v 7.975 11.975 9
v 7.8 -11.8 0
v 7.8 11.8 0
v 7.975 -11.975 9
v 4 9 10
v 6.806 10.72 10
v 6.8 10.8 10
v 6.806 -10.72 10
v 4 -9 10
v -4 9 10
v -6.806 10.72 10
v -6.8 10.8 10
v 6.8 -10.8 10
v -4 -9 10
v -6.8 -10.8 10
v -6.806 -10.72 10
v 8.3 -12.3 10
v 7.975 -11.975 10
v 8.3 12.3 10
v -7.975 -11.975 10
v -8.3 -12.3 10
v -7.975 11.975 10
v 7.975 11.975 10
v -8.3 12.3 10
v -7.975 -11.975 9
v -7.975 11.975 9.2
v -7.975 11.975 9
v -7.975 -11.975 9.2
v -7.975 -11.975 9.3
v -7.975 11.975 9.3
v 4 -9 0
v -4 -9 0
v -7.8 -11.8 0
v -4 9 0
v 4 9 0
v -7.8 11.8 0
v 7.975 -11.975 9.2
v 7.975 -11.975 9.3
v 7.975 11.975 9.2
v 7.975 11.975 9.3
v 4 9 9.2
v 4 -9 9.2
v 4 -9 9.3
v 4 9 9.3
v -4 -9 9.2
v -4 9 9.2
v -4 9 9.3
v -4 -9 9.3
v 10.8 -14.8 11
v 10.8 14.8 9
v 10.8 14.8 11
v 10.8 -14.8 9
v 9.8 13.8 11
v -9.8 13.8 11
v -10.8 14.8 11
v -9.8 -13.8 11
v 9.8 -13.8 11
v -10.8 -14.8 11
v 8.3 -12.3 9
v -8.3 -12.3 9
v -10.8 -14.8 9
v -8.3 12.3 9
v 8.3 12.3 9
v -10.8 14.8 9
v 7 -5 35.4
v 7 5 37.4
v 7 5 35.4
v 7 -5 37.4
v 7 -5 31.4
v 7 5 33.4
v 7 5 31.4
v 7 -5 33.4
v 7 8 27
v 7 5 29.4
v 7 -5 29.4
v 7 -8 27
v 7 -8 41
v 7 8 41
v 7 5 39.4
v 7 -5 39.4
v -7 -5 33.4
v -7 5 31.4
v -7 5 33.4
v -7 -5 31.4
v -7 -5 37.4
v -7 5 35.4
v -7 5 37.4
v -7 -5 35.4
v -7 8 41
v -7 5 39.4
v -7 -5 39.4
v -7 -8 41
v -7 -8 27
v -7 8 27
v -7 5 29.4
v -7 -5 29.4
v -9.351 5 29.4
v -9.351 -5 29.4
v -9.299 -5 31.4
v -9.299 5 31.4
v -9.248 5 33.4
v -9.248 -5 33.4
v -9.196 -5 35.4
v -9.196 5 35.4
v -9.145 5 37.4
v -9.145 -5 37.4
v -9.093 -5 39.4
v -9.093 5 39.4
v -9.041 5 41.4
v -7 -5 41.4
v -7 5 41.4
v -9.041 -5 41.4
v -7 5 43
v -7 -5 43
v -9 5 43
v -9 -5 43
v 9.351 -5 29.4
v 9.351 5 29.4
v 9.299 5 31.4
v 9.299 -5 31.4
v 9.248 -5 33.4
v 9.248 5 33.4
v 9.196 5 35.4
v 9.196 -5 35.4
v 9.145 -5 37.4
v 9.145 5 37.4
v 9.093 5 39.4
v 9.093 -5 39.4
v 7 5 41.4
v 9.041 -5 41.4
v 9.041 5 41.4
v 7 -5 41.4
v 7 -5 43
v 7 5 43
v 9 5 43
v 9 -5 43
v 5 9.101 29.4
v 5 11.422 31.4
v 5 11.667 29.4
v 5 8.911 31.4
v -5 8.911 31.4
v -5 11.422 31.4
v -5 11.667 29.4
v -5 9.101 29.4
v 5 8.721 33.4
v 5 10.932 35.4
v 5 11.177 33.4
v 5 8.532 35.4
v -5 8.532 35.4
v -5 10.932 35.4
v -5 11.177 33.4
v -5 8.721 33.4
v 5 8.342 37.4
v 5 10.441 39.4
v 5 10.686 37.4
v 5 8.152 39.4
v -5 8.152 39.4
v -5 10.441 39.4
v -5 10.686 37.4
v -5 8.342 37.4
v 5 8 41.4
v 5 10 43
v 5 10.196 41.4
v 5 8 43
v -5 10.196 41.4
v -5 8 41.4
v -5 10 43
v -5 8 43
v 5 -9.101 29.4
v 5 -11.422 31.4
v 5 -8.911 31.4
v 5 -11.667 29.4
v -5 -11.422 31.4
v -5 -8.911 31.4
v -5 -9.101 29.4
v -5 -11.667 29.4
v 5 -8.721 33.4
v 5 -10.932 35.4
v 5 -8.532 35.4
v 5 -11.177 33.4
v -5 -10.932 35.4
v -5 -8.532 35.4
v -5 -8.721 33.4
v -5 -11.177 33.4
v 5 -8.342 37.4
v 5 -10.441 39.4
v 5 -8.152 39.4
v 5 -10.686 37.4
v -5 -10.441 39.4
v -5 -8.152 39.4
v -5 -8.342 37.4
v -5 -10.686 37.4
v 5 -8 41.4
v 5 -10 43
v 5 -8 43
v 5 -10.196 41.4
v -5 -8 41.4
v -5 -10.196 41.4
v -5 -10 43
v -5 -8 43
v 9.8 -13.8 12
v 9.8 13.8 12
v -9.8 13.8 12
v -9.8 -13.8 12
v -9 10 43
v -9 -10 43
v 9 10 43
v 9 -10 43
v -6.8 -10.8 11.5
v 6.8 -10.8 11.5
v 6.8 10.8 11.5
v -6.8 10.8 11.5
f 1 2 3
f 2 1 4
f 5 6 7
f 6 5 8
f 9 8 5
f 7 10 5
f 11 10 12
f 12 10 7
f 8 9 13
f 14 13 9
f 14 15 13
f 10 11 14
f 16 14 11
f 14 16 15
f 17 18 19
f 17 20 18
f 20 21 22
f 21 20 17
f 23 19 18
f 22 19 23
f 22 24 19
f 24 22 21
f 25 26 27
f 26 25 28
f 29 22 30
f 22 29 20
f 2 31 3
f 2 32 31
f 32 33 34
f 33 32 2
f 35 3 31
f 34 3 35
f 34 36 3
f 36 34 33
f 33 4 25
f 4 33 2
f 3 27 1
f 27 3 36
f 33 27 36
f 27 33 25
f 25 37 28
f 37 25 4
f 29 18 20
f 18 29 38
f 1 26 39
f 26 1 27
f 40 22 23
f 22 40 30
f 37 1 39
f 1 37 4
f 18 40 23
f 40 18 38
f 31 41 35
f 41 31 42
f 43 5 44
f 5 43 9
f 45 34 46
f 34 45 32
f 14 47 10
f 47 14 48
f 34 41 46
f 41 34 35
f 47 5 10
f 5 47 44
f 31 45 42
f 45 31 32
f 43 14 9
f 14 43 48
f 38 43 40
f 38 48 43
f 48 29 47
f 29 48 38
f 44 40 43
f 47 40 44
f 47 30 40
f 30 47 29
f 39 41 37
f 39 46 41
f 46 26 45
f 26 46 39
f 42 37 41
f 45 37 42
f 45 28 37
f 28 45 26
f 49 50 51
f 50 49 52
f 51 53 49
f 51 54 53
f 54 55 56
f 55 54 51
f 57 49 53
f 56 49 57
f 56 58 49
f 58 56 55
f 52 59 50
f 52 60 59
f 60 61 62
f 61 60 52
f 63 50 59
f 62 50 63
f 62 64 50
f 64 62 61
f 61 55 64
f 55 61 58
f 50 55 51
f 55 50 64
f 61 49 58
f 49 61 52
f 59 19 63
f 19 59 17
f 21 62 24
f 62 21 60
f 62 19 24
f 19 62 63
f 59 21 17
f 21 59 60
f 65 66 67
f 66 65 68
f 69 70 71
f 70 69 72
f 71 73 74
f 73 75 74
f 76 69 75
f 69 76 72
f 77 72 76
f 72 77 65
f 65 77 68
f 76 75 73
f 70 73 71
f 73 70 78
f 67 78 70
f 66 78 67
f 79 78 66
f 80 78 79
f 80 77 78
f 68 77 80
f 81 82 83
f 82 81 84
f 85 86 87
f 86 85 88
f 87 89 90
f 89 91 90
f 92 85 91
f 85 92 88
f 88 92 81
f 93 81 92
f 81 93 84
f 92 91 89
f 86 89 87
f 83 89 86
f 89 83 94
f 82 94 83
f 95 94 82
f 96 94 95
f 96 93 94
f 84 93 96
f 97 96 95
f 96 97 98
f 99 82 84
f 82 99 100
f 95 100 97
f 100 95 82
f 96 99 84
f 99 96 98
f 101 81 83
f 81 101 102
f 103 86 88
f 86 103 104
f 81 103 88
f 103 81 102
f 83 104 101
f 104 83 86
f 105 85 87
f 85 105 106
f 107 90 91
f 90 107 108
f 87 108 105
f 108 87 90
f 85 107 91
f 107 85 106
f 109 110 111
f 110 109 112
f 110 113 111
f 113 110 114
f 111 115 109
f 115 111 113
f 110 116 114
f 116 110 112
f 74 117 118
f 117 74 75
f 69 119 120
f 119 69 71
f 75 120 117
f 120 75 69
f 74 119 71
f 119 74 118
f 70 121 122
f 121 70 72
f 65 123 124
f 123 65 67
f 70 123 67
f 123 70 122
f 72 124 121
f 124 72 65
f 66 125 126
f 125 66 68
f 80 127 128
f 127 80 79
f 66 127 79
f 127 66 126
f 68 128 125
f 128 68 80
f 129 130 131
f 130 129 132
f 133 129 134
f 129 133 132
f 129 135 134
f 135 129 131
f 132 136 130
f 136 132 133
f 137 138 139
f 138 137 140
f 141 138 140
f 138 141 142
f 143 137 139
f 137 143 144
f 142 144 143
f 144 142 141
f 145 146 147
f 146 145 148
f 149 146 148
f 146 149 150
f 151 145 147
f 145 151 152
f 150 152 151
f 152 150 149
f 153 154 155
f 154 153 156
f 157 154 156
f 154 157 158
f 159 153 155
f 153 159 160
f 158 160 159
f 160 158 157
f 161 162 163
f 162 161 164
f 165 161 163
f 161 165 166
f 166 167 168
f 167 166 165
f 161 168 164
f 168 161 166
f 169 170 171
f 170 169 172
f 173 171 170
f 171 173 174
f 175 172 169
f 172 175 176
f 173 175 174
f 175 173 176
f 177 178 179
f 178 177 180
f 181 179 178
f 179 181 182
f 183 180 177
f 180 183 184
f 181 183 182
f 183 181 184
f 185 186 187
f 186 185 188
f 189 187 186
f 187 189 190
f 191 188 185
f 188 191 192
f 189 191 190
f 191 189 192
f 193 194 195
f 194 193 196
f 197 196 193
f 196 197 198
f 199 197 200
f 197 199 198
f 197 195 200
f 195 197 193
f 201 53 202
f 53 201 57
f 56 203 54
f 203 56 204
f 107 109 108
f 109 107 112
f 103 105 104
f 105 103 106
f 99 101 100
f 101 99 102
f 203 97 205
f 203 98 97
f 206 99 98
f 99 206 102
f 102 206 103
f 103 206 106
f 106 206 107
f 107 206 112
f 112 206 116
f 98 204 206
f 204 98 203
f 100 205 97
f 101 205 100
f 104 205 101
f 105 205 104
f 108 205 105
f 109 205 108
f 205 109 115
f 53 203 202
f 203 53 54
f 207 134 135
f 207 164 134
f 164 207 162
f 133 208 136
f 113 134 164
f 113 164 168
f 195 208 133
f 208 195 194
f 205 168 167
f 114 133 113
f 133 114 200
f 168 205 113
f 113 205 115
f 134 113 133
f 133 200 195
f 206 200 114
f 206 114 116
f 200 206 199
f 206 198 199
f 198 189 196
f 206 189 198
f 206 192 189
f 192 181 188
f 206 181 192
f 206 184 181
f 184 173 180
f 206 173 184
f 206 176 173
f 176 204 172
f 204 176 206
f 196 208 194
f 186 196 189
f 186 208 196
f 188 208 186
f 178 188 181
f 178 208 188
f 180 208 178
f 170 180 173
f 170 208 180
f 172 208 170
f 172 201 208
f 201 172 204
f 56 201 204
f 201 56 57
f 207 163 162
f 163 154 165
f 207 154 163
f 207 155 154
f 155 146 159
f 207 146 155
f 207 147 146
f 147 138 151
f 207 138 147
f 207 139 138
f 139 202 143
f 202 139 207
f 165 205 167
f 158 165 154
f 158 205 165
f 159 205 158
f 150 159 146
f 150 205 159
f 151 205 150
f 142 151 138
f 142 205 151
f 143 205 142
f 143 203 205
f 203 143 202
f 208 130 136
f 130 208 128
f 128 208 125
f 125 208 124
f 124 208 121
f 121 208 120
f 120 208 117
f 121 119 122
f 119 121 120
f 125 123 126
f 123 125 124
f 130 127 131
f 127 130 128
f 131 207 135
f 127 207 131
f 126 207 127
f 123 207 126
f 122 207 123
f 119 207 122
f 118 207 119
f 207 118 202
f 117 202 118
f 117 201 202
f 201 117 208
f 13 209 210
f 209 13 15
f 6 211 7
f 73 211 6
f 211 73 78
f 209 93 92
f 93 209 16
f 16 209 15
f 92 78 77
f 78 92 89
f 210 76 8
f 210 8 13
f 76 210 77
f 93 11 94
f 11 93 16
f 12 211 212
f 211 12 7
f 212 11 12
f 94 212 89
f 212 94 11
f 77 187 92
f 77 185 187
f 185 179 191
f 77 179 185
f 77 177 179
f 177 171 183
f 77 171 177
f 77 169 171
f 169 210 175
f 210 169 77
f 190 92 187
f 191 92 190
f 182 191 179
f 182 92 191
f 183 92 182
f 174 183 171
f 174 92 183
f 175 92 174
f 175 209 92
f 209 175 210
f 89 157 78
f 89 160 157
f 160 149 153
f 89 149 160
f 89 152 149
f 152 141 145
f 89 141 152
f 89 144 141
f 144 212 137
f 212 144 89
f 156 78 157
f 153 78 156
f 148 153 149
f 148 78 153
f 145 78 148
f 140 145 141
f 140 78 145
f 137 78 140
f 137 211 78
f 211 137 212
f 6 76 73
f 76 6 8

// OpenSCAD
// file: sleds.scad
// ==========================================
// Xentient Framework - Universal Sled & Socket Library
// Shared modules for all peripheral caps
// ==========================================
// Per Framework §2: Universal Mating Protocol
// Female Socket (in hub): 24.4×16.4×10.0mm (0.4mm clearance), wire channel 18×8mm
// Male Sled (on cap base): 23.6×15.6×10.0mm, 1° draft, hollow 18×8mm
// Flange: +3mm each side (increased from +2mm for bearing strength)
// Units: mm

$fn = 64;

// ==========================================
// MALE SLED PARAMETERS
// ==========================================

Sled_W       = 23.6;    // Width (0.4mm tolerance in female 24.0mm)
Sled_H       = 15.6;    // Height (0.4mm tolerance in female 16.0mm)
Sled_D       = 10.0;    // Depth (insertion length)
Sled_Draft   = 1.0;     // 1-degree draft angle
Sled_Wire_W  = 18.0;    // Wire pass-through width
Sled_Wire_H  = 8.0;     // Wire pass-through height
Sled_Wall    = 2.0;     // Minimum wall thickness

// Derived
Sled_Draft_Off = Sled_D * tan(Sled_Draft);  // ~0.17mm per side

// ==========================================
// MODULE: male_sled()
// The plug base that inserts into the hub's female socket.
// All caps start with this at their base.
//
// Usage: difference() { male_sled(); /* your cap-specific cutouts */ }
// ==========================================

module male_sled() {
    difference() {
        // Outer body with 1° draft
        hull() {
            // Entry face (slightly larger for wedge fit)
            translate([0, 0, Sled_D - 0.5])
                cube([Sled_H + 2*Sled_Draft_Off,
                      Sled_W + 2*Sled_Draft_Off,
                      1], center=true);
            // Inner face (exact size)
            translate([0, 0, 0.5])
                cube([Sled_H, Sled_W, 1], center=true);
        }

        // Wire pass-through (hollow core)
        translate([0, 0, Sled_D / 2])
            cube([Sled_Wire_H, Sled_Wire_W, Sled_D + 2], center=true);

        // Entry chamfer (45° for easy insertion)
        chamfer_h = 1.5;
        translate([0, 0, Sled_D - chamfer_h/2])
            hull() {
                cube([Sled_H + 2*chamfer_h, Sled_W + 2*chamfer_h, 0.1], center=true);
                cube([Sled_H, Sled_W, 0.1], center=true);
            }
    }
}

// ==========================================
// MODULE: male_sled_with_flange()
// Adds a flange around the sled base for cap-to-hub transition.
// Flange sits flush against hub exterior face.
//
// flange_w: extra width beyond sled on each side
// flange_h: extra height beyond sled on each side
// flange_t: flange thickness
// ==========================================

module male_sled_with_flange(flange_w=3.0, flange_h=3.0, flange_t=2.0) {
    union() {
        male_sled();

        // Flange ring around sled entry
        translate([0, 0, Sled_D])
            difference() {
                cube([Sled_H + 2*flange_h,
                      Sled_W + 2*flange_w,
                      flange_t], center=true);
                // Cut sled opening through flange
                cube([Sled_H + 1, Sled_W + 1, flange_t + 2], center=true);
            }
    }
}

// ==========================================
// MODULE: wire_channel()
// Internal wire routing channel from sled to component.
// Extends from sled core outward through the cap body.
//
// length: distance from sled to component
// direction: "straight" or "angled"
// ==========================================

module wire_channel(length=15, direction="straight") {
    if (direction == "straight") {
        translate([0, 0, Sled_D / 2 + length / 2])
            cube([Sled_Wire_H, Sled_Wire_W, length + 1], center=true);
    }
}

// ==========================================
// VISUALIZATION HELPERS
// ==========================================

// Render just the sled for testing
// male_sled();
// main file
// ==========================================
// Xentient Framework - Housing 3: Climate (BME280)
// Standoff vented box with 15mm extension from hub
// ==========================================
// Component: BME280 breakout (13×10mm) + 100nF cap
// Connection: 6-pin JST XH pigtail (I2C: VCC, GND, SDA, SCL, NC, NC)
//              4 active pins, 2 unused/NC
// Socket: 150° face (away from heat sources)
// Per Framework §4 Housing 3
// CRITICAL: Must extend 15mm+ from hub to avoid reading hub's own heat
// Units: mm

include <sleds.scad>;

$fn = 64;

// ==========================================
// COMPONENT DIMENSIONS
// ==========================================

BME_W    = 13.0;    // BME280 board width
BME_H    = 10.0;    // BME280 board height
BME_T    = 1.6;     // PCB thickness
BME_Clear = 0.4;    // Clearance per side

// Housing dimensions
Ext_Length = 15.0;  // Minimum extension from hub face (CRITICAL)
Box_W      = 20.0;  // Housing width (sled 24mm → 20mm at sensor end)
Box_H      = 18.0;  // Housing height
Box_D      = 18.0;  // Housing depth (extension length)
House_Wall = 2.0;   // Wall thickness
Vent_N     = 4;     // Louver slits per side
Vent_W     = 2.0;   // Slit width
Vent_L     = 10.0;  // Slit length
Vent_Spc   = 4.0;   // Slit spacing
PCB_Shelf_H = 3.0;  // Shelf height for BME board

// ==========================================
// MODULE: housing_climate()
// ==========================================

module housing_climate() {
    union() {
        // Sled base with flange
        male_sled_with_flange(flange_w=3.0, flange_h=3.0, flange_t=2.0);

        // Transition + extended box
        translate([0, 0, Sled_D]) {
            difference() {
                // Outer shell: sled face → standoff box
                hull() {
                    // Transition from sled face
                    translate([0, 0, 1])
                        cube([Sled_H + 4, Sled_W + 4, 2], center=true);
                    // Extended box at sensor end
                    translate([0, 0, Ext_Length + Box_D / 2])
                        cube([Box_H, Box_W, Box_D], center=true);
                }

                // Inner cavity
                hull() {
                    translate([0, 0, 0.5])
                        cube([Sled_H - 2, Sled_W - 2, 2], center=true);
                    translate([0, 0, Ext_Length + Box_D / 2])
                        cube([Box_H - 2*House_Wall, Box_W - 2*House_Wall, Box_D - 2*House_Wall], center=true);
                }

                // BME280 mount shelf (at sensor end)
                translate([0, 0, Ext_Length + Box_D * 0.7])
                    difference() {
                        cube([Box_H - 2*House_Wall, Box_W - 2*House_Wall, PCB_Shelf_H], center=true);
                        // Cutout for BME board (sits on shelf)
                        translate([0, 0, PCB_Shelf_H/2])
                            cube([BME_W + BME_Clear, BME_H + BME_Clear, PCB_Shelf_H], center=true);
                    }

                // Wire channel through transition
                translate([0, 0, -2])
                    cube([Sled_Wire_H, Sled_Wire_W, Ext_Length + Box_D + 6], center=true);

                // ===== LOUVERED VENTILATION SLITS =====
                // Left side gills
                for (i = [0 : Vent_N - 1]) {
                    vz = Ext_Length + Box_D * 0.3 + i * Vent_Spc;
                    translate([-Box_H/2 - 1, 0, vz])
                        rotate([0, 90, 0])
                            cube([Vent_W, Vent_L, House_Wall + 4], center=true);
                }
                // Right side gills
                for (i = [0 : Vent_N - 1]) {
                    vz = Ext_Length + Box_D * 0.3 + i * Vent_Spc;
                    translate([Box_H/2 + 1, 0, vz])
                        rotate([0, 90, 0])
                            cube([Vent_W, Vent_L, House_Wall + 4], center=true);
                }
                // Top gills
                for (i = [0 : Vent_N - 1]) {
                    vz = Ext_Length + Box_D * 0.3 + i * Vent_Spc;
                    translate([0, Box_W/2 + 1, vz])
                        cube([Vent_L, House_Wall + 4, Vent_W], center=true);
                }
                // Bottom gills
                for (i = [0 : Vent_N - 1]) {
                    vz = Ext_Length + Box_D * 0.3 + i * Vent_Spc;
                    translate([0, -Box_W/2 - 1, vz])
                        cube([Vent_L, House_Wall + 4, Vent_W], center=true);
                }
            }
        }
    }
}

// ==========================================
// RENDER
// ==========================================

housing_climate();
